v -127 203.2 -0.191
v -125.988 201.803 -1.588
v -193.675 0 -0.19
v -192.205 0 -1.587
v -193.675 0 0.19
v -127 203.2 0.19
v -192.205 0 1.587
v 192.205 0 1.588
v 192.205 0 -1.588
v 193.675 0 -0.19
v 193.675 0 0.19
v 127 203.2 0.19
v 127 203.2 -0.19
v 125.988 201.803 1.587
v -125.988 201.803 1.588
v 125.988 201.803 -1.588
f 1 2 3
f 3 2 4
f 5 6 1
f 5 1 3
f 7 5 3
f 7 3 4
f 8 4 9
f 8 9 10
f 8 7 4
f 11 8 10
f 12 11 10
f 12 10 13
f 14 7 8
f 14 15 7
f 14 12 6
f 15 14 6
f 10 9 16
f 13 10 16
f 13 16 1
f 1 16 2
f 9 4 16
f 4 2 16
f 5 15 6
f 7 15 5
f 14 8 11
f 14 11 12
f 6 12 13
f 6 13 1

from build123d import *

# Parameters (mm, degrees)
EXTRUDE1_DEPTH = 1.5875
CHAMFER1_SIZE  = 1.397


with BuildPart() as part:
    # Sketch1 → Extrude1 (new, symmetric)
    with BuildSketch(Plane.XY):
        Polygon((0, 0), (193.675, 0), (127, 203.2), (0, 203.2), (-127, 203.2), (-193.675, 0), align=None)
    extrude(amount=EXTRUDE1_DEPTH, both=True)

    # Chamfer1
    chamfer1_edges = [part.edges().sort_by_distance(p)[0] for p in [
        (160.3375, 101.6, 1.5875),
        (0, 203.2, 1.5875),
        (-160.3375, 101.6, 1.5875),
        (-160.3375, 101.6, -1.5875),
        (0, 203.2, -1.5875),
        (160.3375, 101.6, -1.5875),
    ]]
    chamfer(chamfer1_edges, length=CHAMFER1_SIZE)


solid = part.part
